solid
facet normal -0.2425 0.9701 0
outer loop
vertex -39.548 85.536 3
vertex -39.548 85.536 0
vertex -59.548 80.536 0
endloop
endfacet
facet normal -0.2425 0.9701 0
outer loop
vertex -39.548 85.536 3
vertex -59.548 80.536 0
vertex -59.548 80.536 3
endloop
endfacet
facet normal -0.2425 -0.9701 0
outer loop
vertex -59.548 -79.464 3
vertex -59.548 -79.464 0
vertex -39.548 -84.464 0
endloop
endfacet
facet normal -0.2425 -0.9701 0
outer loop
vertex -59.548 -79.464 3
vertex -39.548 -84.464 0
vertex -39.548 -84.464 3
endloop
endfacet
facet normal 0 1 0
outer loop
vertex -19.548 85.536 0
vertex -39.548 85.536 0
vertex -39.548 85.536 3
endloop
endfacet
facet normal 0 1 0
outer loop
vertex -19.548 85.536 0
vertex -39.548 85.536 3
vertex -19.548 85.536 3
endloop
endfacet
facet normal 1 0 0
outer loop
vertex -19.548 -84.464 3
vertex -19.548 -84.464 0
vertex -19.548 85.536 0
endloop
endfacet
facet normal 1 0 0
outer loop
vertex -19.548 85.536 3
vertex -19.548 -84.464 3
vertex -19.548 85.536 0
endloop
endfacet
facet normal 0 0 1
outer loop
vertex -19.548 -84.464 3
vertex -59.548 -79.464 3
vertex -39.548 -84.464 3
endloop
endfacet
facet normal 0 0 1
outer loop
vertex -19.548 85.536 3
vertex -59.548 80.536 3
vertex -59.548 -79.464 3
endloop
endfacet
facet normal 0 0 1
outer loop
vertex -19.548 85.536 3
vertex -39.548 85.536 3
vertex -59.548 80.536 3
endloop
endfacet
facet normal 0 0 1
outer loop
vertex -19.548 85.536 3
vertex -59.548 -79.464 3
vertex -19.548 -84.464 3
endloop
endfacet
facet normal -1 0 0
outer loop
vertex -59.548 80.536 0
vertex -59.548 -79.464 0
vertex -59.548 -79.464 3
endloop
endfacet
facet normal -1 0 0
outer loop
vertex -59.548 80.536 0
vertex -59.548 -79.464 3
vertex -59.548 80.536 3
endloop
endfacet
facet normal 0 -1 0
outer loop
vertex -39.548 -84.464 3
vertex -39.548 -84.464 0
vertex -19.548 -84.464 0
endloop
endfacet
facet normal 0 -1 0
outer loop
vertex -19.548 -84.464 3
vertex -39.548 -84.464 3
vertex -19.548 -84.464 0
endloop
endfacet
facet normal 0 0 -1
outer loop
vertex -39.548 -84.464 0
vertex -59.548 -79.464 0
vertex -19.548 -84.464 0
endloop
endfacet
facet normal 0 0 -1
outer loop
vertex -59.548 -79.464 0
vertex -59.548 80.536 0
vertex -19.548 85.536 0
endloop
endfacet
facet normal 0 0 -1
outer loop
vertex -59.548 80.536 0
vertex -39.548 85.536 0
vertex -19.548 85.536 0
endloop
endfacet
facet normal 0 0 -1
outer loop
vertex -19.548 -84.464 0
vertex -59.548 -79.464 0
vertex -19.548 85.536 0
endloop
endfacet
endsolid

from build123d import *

# Parameters (mm, degrees)
F0_W     = 40
F0_H     = 170
F1_DEPTH = 3
F2_SIZE2 = 5
F2_SIZE  = 20
F3_SIZE2 = 20
F3_SIZE  = 5


with BuildPart() as f1:
    # F0 (on Top) → F1 (new body)
    with BuildSketch(Plane.XY):
        with Locations((-39.5484667792, 0.5357116461)):
            Rectangle(F0_W, F0_H)
    extrude(amount=F1_DEPTH)

    # F2
    f2_edges = [f1.edges().sort_by_distance(p)[0] for p in [
        (-59.548467, -84.464288, 1.5),
    ]]
    f2_side = f1.faces().sort_by_distance((-39.548467, -84.464288, 1.5))[0]
    chamfer(f2_edges, length=F2_SIZE, length2=F2_SIZE2, reference=f2_side)

    # F3
    f3_edges = [f1.edges().sort_by_distance(p)[0] for p in [
        (-59.548467, 85.535712, 1.5),
    ]]
    f3_side = f1.faces().sort_by_distance((-59.548467, 3.035712, 1.5))[0]
    chamfer(f3_edges, length=F3_SIZE, length2=F3_SIZE2, reference=f3_side)


solid = f1.part
